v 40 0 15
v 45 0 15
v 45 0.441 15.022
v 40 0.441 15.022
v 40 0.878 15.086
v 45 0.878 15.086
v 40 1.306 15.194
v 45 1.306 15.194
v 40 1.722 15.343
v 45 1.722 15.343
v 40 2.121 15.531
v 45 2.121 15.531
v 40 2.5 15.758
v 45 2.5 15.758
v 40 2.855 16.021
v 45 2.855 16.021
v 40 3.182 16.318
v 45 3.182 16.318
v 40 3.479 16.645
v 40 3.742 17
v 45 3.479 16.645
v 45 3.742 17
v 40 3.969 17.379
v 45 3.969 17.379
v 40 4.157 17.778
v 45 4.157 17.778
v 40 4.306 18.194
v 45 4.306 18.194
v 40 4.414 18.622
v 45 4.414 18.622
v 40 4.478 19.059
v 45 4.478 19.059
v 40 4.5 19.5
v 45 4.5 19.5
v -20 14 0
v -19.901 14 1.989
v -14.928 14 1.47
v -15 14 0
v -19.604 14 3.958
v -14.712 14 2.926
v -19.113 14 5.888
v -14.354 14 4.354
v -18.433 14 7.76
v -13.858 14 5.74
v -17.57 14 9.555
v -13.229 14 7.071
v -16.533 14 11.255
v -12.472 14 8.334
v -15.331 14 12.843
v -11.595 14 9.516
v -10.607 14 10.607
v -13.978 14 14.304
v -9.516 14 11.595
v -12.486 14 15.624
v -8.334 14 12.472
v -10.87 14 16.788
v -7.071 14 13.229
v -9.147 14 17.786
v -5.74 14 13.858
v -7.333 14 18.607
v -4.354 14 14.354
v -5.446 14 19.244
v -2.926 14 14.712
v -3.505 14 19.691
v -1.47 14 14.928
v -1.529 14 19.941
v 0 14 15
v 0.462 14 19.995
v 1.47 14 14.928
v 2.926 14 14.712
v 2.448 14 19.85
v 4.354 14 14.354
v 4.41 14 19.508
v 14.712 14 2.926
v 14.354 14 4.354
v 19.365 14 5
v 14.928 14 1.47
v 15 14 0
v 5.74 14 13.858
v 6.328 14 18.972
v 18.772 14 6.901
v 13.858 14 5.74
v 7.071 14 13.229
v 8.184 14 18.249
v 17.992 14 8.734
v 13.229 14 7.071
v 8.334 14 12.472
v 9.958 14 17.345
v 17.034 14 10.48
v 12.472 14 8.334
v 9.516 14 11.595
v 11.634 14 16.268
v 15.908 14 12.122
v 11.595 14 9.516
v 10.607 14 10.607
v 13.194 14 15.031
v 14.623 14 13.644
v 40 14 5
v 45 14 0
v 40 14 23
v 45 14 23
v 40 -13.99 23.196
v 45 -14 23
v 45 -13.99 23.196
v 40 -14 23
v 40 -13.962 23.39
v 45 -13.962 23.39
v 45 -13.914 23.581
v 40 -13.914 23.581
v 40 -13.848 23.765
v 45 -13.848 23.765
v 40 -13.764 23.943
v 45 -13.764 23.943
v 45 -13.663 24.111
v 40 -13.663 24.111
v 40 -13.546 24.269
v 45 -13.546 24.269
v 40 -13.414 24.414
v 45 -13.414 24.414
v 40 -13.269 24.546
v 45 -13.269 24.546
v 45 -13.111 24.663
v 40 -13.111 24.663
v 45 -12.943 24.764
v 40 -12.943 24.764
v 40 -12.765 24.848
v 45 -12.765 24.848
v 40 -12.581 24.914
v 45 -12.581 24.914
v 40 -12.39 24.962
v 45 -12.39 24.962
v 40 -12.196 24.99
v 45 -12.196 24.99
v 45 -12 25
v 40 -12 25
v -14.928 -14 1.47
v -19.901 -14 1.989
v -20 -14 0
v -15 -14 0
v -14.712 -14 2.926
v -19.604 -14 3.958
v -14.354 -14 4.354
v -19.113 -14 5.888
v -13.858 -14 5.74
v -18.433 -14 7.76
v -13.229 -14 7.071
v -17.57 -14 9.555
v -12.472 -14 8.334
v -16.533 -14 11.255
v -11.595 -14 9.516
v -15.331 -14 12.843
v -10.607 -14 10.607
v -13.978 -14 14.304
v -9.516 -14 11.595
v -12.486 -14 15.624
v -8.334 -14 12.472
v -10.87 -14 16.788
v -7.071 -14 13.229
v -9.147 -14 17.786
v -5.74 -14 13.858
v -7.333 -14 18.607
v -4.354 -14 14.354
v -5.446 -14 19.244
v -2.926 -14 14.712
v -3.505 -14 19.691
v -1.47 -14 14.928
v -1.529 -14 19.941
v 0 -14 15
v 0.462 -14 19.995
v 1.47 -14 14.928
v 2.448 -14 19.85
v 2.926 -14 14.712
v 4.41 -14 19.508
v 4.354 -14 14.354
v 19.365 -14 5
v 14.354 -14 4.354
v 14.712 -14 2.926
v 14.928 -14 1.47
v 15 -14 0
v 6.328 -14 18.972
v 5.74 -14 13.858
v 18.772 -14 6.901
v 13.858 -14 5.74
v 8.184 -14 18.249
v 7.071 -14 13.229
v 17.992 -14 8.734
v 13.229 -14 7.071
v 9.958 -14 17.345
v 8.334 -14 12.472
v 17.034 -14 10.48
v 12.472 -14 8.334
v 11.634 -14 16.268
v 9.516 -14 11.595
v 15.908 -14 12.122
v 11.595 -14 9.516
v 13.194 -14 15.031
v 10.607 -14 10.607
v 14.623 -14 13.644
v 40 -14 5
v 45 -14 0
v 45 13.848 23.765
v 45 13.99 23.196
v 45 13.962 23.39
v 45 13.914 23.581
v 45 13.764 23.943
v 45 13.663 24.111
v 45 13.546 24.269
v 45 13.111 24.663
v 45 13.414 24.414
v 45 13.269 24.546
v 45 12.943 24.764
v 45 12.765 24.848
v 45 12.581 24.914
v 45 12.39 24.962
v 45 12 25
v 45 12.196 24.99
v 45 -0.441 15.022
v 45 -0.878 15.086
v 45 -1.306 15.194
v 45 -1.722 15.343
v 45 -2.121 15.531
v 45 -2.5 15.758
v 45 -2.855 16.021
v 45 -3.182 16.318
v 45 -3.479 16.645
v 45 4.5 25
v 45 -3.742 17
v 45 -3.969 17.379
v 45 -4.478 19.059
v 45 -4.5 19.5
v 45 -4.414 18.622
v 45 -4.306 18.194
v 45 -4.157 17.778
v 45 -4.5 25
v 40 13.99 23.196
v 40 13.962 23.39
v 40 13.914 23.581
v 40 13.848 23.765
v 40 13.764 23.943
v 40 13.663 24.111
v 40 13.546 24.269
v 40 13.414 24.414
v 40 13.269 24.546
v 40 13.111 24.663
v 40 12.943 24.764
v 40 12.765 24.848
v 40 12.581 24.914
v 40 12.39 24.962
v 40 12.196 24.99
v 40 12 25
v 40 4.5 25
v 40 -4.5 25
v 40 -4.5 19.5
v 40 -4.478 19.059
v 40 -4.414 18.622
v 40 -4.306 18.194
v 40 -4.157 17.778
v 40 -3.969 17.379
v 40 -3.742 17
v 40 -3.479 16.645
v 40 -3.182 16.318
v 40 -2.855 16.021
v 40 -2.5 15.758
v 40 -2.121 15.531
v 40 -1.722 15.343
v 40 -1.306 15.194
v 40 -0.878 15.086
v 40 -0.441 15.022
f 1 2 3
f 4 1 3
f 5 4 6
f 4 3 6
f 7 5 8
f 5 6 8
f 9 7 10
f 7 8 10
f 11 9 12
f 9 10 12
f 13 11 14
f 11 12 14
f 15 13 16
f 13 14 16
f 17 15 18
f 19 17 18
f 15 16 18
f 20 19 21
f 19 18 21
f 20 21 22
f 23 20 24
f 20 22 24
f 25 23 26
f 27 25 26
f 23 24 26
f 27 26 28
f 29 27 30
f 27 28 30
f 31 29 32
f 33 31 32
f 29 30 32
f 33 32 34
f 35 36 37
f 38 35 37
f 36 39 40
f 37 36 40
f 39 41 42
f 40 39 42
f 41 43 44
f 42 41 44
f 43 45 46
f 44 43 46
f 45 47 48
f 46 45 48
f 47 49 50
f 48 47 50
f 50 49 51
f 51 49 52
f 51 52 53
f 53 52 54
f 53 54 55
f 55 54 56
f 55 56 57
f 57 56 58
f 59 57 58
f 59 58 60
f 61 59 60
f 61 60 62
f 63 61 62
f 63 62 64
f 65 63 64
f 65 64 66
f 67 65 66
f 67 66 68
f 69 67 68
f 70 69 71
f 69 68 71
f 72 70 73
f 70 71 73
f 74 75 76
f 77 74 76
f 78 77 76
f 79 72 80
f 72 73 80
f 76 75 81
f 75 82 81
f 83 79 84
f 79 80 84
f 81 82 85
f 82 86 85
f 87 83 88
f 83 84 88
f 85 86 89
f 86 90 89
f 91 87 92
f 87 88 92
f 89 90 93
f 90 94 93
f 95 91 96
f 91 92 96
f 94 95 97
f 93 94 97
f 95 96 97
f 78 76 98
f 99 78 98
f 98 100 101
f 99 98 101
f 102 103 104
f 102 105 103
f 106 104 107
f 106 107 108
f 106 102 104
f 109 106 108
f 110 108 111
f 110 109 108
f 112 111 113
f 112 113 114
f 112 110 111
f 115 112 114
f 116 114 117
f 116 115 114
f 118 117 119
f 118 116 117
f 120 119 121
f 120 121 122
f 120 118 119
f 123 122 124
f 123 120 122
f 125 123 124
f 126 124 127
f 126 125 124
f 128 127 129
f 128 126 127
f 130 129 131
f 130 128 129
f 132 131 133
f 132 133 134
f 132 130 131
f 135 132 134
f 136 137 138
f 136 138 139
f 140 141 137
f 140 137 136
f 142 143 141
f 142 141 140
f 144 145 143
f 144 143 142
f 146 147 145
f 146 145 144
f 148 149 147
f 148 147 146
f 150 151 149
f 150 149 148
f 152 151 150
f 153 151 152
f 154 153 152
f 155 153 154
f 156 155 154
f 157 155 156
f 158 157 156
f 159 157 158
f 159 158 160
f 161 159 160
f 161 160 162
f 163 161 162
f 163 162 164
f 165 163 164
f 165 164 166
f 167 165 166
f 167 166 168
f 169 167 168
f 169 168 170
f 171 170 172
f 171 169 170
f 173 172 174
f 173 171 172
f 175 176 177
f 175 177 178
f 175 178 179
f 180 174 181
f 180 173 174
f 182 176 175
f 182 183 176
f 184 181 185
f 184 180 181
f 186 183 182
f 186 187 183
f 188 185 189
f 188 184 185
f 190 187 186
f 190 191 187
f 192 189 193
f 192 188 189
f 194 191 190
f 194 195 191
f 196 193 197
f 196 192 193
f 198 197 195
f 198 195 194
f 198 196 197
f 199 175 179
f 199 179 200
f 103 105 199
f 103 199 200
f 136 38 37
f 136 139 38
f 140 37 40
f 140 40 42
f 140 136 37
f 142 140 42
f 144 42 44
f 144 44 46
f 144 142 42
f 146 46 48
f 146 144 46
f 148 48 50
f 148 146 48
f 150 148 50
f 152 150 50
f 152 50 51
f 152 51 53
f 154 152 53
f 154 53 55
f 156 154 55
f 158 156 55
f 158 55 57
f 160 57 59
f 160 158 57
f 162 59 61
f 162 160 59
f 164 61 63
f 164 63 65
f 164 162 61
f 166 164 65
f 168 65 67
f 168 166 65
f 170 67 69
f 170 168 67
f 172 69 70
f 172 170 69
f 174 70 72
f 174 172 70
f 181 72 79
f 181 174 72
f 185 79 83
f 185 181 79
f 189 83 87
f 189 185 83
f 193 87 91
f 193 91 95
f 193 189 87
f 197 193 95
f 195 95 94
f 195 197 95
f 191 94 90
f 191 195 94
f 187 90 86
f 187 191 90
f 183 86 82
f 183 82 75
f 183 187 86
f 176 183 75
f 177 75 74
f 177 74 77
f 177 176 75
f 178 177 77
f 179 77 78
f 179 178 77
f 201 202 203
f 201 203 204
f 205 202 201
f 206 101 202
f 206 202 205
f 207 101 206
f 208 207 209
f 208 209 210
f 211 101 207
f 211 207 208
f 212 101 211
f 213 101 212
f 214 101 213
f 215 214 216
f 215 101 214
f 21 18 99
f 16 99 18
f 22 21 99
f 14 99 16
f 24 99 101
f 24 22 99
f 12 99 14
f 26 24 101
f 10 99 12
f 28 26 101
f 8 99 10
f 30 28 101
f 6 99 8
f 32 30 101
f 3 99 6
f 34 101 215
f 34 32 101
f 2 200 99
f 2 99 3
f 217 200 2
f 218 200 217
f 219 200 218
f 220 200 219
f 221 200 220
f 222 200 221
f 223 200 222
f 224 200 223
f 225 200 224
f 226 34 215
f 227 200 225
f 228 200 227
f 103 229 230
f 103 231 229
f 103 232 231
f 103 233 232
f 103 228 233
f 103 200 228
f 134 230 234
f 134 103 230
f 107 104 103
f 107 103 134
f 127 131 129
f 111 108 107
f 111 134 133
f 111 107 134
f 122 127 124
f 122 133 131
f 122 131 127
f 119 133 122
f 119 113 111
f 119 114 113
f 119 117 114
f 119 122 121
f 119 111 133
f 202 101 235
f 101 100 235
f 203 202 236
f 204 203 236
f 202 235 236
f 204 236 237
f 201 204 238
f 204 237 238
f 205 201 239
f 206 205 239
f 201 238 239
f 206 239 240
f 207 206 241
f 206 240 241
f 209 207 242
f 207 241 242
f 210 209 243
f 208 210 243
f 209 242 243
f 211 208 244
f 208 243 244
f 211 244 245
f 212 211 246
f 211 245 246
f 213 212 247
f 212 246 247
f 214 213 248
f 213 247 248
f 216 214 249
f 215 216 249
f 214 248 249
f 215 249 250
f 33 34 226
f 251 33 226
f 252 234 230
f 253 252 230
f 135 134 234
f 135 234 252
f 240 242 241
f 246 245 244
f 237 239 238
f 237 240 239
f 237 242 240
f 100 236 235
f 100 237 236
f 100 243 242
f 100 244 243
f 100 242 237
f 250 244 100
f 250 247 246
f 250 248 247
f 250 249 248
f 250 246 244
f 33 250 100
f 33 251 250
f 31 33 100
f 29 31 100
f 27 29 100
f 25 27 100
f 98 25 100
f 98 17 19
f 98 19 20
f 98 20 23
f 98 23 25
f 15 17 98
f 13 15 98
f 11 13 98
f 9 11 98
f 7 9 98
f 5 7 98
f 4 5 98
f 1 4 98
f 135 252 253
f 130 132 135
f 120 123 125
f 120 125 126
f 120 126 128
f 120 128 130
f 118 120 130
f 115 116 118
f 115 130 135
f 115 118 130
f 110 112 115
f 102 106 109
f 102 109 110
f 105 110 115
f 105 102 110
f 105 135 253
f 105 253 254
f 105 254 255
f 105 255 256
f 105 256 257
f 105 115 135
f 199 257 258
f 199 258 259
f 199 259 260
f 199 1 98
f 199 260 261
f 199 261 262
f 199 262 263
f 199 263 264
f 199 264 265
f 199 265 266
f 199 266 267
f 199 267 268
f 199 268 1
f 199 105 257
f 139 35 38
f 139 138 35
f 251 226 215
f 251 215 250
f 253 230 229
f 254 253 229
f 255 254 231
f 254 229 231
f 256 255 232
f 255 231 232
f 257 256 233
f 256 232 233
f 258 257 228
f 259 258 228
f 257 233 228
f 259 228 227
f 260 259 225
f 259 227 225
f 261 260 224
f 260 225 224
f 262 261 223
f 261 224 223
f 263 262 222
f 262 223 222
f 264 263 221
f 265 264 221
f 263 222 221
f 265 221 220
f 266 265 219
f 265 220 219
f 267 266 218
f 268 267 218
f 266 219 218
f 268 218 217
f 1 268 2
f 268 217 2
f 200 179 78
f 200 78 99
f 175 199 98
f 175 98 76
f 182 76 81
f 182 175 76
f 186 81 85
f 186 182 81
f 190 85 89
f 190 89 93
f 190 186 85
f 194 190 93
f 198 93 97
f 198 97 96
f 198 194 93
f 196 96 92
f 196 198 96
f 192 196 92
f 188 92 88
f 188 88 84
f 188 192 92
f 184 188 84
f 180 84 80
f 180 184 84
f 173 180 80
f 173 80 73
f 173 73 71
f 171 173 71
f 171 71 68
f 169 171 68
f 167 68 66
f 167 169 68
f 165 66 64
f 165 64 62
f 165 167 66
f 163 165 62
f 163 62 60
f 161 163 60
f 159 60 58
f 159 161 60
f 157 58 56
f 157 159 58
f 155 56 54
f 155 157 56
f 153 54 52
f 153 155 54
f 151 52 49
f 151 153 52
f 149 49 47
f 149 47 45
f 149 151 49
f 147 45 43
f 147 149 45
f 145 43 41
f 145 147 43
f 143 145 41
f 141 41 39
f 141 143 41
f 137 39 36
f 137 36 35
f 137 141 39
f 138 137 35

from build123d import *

# Parameters (mm, degrees)
F1_DEPTH = 14
F3_DEPTH = 5
F4_R     = 2


with BuildPart() as f1:
    # F0 (on Front) → F1 (new body, symmetric)
    with BuildSketch(Plane.XZ):
        with BuildLine():
            ThreePointArc((-15, 0), (0, 15), (15, 0))
            Line((15, 0), (45, 0))
            Line((45, 0), (45, 25))
            Line((45, 25), (40, 25))
            Line((40, 25), (40, 5))
            Line((40, 5), (19.364916731, 5))
            ThreePointArc((19.364916731, 5), (-2.5200858497, 19.8405939253), (-20, 0))
            Line((-20, 0), (-15, 0))
        make_face()
    extrude(amount=F1_DEPTH, both=True)

    # F2 (on face) → F3 (cut, through all)
    with BuildSketch(Plane.YZ.offset(45)):
        with BuildLine():
            ThreePointArc((-4.5, 19.5), (-3.1819805217, 16.318019491), (-1.79e-08, 15))
            ThreePointArc((-1.79e-08, 15), (3.181980509, 16.3180194783), (4.5, 19.5))
            Line((4.5, 19.5), (4.5, 25))
            Line((4.5, 25), (-4.5, 25))
            Line((-4.5, 25), (-4.5, 19.5))
        make_face()
    extrude(amount=-F3_DEPTH, mode=Mode.SUBTRACT)

    # F4
    f4_edges = [f1.edges().sort_by_distance(p)[0] for p in [
        (42.5, -14, 25),
        (42.5, 14, 25),
    ]]
    fillet(f4_edges, radius=F4_R)


solid = f1.part
